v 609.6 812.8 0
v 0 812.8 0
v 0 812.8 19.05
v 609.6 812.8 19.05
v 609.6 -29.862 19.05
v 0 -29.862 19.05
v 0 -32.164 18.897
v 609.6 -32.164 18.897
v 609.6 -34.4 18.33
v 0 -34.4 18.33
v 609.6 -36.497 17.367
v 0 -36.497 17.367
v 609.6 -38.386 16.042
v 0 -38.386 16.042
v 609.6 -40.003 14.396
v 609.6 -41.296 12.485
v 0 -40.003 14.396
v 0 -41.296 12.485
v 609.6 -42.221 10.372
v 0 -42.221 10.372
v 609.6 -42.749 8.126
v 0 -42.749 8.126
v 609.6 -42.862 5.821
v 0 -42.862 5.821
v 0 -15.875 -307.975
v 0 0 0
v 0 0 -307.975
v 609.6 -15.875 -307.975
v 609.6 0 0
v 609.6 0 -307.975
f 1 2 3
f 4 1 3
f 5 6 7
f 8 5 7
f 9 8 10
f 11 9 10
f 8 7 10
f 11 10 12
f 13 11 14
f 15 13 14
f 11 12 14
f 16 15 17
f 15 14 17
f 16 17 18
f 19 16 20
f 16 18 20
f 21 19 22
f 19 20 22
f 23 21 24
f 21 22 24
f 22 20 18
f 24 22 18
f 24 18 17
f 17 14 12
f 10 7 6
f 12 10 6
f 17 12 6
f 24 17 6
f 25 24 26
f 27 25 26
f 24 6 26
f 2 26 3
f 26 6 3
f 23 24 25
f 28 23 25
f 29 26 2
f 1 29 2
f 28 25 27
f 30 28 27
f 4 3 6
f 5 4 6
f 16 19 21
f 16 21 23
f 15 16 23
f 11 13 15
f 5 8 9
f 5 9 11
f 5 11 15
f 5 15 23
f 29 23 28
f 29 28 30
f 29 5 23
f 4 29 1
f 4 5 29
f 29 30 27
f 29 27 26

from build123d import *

# Parameters (mm, degrees)
F1_DEPTH = 609.6


with BuildPart() as f1:
    # F0 (on Right) → F1 (new body)
    with BuildSketch(Plane.YZ):
        with BuildLine():
            Line((0, -307.975), (0, 0))
            Line((0, 0), (812.8, 0))
            Line((812.8, 0), (812.8, 19.05))
            Line((812.8, 19.05), (-29.861867, 19.05))
            ThreePointArc((-29.861867, 19.05), (-39.231667, 15.255664), (-42.8625, 5.821301))
            Line((-42.8625, 5.821301), (-15.875, -307.975))
            Line((-15.875, -307.975), (0, -307.975))
        make_face()
    extrude(amount=F1_DEPTH)


solid = f1.part
